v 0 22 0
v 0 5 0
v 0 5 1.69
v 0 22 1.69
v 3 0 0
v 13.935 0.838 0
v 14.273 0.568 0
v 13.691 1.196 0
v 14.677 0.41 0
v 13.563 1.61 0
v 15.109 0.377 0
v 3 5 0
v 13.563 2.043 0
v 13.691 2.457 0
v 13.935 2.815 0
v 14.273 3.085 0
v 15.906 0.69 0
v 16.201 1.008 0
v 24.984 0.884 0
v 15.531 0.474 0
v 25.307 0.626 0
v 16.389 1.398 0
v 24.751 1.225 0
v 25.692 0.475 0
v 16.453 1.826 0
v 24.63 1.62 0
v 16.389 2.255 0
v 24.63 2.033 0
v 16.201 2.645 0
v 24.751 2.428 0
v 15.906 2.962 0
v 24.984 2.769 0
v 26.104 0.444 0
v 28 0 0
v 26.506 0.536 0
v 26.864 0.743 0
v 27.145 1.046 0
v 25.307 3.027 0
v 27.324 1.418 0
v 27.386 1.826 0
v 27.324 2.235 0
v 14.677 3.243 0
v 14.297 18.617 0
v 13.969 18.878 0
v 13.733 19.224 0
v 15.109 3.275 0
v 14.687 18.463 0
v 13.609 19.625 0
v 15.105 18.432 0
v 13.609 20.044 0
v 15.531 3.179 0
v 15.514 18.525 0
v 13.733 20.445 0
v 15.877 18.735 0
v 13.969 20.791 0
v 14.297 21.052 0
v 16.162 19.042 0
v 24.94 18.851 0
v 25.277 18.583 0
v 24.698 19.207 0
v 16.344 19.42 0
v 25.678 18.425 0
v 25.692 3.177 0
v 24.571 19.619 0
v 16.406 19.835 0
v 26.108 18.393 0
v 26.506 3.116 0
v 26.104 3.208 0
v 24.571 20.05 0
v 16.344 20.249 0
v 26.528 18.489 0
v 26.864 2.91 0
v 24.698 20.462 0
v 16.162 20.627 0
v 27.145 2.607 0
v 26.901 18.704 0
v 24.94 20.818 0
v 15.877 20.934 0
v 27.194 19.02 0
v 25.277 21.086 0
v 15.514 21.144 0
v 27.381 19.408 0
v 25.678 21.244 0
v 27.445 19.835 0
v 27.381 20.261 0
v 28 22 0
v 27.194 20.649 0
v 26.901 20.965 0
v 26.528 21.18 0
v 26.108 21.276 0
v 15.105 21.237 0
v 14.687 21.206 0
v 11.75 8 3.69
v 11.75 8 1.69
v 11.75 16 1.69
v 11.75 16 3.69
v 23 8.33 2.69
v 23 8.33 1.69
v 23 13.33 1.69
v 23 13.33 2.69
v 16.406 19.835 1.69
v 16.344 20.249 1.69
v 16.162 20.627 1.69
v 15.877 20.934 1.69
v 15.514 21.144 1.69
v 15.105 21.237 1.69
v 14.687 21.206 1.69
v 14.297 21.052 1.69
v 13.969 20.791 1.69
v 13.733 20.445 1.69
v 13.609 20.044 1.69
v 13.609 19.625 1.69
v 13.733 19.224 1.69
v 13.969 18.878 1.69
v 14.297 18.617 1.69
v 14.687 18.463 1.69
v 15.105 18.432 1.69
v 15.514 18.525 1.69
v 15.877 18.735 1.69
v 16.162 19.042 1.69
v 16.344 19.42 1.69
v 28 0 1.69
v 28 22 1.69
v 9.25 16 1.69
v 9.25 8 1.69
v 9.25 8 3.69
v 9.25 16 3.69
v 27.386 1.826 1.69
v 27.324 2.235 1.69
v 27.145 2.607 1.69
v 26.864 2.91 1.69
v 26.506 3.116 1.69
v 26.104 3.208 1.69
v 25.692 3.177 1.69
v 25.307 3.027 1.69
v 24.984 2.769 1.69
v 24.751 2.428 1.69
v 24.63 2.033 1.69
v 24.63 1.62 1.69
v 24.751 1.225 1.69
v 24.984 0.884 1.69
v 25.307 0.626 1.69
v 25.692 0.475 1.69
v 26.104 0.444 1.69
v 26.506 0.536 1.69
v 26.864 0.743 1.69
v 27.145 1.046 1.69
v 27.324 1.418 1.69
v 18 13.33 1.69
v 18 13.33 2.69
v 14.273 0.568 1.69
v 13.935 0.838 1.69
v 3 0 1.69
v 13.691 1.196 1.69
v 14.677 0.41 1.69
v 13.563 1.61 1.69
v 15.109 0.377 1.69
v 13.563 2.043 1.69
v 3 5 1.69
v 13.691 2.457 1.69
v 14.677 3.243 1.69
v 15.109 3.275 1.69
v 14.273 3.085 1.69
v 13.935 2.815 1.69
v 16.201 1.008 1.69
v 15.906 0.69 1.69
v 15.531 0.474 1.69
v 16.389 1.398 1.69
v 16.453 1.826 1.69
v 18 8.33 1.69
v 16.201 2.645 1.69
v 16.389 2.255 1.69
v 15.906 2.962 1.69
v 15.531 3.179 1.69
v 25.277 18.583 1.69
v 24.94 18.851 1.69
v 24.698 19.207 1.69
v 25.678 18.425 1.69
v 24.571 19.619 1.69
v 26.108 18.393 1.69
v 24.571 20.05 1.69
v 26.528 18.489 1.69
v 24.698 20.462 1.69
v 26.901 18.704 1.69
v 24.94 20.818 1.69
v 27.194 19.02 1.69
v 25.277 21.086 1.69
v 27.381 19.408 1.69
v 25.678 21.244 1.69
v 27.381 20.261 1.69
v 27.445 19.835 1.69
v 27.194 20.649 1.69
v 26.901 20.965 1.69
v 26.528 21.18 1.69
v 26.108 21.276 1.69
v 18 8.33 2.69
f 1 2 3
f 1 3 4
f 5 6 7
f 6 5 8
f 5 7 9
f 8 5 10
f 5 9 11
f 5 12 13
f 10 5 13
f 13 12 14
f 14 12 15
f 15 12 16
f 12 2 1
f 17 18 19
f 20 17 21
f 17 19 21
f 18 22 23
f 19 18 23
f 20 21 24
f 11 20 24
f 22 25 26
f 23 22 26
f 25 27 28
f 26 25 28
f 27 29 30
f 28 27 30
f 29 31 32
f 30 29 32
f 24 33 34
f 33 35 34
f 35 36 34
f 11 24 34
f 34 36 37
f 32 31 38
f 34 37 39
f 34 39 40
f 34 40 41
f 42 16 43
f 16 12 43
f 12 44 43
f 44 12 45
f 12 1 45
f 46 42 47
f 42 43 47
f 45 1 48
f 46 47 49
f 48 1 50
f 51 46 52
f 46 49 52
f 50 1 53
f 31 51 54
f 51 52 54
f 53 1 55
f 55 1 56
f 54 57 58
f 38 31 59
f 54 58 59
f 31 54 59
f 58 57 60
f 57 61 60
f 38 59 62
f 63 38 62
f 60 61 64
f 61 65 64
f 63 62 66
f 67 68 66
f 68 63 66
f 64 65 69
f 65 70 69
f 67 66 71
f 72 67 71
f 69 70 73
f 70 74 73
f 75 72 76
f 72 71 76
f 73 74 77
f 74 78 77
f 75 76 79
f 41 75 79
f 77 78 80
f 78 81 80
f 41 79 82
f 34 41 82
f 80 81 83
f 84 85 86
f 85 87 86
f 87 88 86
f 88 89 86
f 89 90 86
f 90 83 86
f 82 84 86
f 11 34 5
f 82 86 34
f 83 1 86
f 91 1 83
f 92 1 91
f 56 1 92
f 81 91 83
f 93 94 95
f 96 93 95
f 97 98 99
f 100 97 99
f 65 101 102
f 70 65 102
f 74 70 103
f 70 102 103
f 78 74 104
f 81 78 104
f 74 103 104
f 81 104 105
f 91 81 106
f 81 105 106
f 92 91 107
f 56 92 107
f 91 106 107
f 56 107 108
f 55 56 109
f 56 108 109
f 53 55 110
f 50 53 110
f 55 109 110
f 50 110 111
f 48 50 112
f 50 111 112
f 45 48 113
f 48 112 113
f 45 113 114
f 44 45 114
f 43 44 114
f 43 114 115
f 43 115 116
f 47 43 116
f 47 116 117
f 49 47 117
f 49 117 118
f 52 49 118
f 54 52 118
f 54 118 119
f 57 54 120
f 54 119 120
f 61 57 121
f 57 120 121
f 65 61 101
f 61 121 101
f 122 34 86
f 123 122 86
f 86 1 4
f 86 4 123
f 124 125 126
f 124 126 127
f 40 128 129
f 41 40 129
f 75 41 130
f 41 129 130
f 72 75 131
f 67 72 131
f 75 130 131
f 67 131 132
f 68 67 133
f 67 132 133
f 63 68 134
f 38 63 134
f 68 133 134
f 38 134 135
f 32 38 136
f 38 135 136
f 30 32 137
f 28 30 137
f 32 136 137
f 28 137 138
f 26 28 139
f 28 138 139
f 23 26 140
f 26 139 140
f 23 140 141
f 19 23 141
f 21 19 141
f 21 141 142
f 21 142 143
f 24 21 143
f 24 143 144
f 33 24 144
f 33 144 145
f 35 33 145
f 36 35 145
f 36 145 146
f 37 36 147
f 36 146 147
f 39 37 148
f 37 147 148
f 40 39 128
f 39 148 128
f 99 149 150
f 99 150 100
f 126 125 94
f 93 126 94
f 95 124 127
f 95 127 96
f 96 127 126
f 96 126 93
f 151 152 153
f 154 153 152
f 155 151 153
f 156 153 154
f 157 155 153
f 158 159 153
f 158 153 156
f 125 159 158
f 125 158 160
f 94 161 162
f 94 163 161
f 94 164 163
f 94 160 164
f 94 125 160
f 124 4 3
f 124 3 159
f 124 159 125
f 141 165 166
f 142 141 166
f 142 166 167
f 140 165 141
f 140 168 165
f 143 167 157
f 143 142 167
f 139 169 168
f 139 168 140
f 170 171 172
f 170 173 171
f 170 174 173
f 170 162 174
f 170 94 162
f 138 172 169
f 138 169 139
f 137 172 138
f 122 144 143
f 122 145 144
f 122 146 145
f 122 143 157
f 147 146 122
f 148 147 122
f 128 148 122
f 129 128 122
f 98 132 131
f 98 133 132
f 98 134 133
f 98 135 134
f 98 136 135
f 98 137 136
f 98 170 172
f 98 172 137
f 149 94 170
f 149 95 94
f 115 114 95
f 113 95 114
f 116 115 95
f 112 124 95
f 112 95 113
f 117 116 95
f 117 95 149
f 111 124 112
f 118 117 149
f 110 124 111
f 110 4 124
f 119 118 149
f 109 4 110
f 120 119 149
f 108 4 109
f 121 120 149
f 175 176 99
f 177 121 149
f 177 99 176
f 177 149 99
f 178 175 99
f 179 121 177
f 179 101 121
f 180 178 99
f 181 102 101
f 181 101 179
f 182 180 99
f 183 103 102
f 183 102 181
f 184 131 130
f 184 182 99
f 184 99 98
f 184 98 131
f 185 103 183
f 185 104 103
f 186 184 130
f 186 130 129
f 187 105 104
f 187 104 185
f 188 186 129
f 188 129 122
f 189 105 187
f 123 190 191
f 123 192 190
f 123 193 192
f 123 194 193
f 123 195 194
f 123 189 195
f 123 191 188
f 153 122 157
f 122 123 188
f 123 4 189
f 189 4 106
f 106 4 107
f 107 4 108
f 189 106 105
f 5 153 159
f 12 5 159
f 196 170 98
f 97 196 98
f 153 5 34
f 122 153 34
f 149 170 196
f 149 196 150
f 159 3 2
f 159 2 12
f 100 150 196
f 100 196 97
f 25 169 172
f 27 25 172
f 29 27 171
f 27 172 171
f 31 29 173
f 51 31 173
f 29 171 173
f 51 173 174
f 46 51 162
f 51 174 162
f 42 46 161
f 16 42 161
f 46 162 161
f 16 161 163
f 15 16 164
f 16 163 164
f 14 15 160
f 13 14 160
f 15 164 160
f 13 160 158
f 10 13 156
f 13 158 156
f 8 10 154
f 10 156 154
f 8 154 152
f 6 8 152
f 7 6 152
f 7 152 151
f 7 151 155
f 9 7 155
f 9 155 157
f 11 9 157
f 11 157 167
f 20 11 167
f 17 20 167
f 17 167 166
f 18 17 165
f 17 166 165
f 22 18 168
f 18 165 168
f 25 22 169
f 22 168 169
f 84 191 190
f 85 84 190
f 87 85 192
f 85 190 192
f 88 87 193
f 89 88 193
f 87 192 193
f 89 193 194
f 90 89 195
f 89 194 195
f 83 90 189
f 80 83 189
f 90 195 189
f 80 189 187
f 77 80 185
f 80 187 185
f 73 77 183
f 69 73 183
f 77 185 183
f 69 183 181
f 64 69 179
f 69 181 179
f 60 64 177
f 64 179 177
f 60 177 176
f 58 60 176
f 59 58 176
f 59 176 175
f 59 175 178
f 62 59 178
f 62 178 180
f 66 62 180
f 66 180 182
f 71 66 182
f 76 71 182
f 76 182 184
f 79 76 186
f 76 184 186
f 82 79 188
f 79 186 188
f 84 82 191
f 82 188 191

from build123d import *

# Parameters (mm, degrees)
SKETCH1_W           = 28
SKETCH1_H           = 22
BOSS_EXTRUDE1_DEPTH = 1.69
SKETCH2_R           = 1.445350302
SKETCH2_R_2         = 1.385905996
SKETCH2_R_3         = 1.453223353
SKETCH2_R_4         = 1.406338145
CUT_EXTRUDE1_DEPTH  = 1.69
SKETCH3_W           = 5
SKETCH3_H           = 5
BOSS_EXTRUDE2_DEPTH = 1
SKETCH4_W           = 2.5
SKETCH4_H           = 8
BOSS_EXTRUDE3_DEPTH = 2
SKETCH5_W           = 3
SKETCH5_H           = 5
CUT_EXTRUDE2_DEPTH  = 10


with BuildPart() as part:
    # Sketch1 → Boss-Extrude1 (new body)
    with BuildSketch(Plane.XY):
        with Locations((14, 11)):
            Rectangle(SKETCH1_W, SKETCH1_H)
    extrude(amount=BOSS_EXTRUDE1_DEPTH)

    # Sketch2 → Cut-Extrude1 (cut)
    with BuildSketch(Plane.XY.offset(1.69)):
        with Locations((26, 19.834515058)):
            Circle(SKETCH2_R)
        with Locations((26, 1.826288901)):
            Circle(SKETCH2_R_2)
        with Locations((15, 1.826288901)):
            Circle(SKETCH2_R_3)
        with Locations((15, 19.834515058)):
            Circle(SKETCH2_R_4)
    extrude(amount=-CUT_EXTRUDE1_DEPTH, mode=Mode.SUBTRACT)

    # Sketch3 → Boss-Extrude2 (add)
    with BuildSketch(Plane.XY.offset(1.69)):
        with Locations((20.5, 10.83040198)):
            Rectangle(SKETCH3_W, SKETCH3_H)
    extrude(amount=BOSS_EXTRUDE2_DEPTH)

    # Sketch4 → Boss-Extrude3 (add)
    with BuildSketch(Plane.XY.offset(1.69)):
        with Locations((10.5, 12)):
            Rectangle(SKETCH4_W, SKETCH4_H)
    extrude(amount=BOSS_EXTRUDE3_DEPTH)

    # Sketch5 → Cut-Extrude2 (cut)
    with BuildSketch(Plane.XY.offset(1.69)):
        with Locations((1.5, 2.5)):
            Rectangle(SKETCH5_W, SKETCH5_H)
    extrude(amount=-CUT_EXTRUDE2_DEPTH, mode=Mode.SUBTRACT)


solid = part.part
